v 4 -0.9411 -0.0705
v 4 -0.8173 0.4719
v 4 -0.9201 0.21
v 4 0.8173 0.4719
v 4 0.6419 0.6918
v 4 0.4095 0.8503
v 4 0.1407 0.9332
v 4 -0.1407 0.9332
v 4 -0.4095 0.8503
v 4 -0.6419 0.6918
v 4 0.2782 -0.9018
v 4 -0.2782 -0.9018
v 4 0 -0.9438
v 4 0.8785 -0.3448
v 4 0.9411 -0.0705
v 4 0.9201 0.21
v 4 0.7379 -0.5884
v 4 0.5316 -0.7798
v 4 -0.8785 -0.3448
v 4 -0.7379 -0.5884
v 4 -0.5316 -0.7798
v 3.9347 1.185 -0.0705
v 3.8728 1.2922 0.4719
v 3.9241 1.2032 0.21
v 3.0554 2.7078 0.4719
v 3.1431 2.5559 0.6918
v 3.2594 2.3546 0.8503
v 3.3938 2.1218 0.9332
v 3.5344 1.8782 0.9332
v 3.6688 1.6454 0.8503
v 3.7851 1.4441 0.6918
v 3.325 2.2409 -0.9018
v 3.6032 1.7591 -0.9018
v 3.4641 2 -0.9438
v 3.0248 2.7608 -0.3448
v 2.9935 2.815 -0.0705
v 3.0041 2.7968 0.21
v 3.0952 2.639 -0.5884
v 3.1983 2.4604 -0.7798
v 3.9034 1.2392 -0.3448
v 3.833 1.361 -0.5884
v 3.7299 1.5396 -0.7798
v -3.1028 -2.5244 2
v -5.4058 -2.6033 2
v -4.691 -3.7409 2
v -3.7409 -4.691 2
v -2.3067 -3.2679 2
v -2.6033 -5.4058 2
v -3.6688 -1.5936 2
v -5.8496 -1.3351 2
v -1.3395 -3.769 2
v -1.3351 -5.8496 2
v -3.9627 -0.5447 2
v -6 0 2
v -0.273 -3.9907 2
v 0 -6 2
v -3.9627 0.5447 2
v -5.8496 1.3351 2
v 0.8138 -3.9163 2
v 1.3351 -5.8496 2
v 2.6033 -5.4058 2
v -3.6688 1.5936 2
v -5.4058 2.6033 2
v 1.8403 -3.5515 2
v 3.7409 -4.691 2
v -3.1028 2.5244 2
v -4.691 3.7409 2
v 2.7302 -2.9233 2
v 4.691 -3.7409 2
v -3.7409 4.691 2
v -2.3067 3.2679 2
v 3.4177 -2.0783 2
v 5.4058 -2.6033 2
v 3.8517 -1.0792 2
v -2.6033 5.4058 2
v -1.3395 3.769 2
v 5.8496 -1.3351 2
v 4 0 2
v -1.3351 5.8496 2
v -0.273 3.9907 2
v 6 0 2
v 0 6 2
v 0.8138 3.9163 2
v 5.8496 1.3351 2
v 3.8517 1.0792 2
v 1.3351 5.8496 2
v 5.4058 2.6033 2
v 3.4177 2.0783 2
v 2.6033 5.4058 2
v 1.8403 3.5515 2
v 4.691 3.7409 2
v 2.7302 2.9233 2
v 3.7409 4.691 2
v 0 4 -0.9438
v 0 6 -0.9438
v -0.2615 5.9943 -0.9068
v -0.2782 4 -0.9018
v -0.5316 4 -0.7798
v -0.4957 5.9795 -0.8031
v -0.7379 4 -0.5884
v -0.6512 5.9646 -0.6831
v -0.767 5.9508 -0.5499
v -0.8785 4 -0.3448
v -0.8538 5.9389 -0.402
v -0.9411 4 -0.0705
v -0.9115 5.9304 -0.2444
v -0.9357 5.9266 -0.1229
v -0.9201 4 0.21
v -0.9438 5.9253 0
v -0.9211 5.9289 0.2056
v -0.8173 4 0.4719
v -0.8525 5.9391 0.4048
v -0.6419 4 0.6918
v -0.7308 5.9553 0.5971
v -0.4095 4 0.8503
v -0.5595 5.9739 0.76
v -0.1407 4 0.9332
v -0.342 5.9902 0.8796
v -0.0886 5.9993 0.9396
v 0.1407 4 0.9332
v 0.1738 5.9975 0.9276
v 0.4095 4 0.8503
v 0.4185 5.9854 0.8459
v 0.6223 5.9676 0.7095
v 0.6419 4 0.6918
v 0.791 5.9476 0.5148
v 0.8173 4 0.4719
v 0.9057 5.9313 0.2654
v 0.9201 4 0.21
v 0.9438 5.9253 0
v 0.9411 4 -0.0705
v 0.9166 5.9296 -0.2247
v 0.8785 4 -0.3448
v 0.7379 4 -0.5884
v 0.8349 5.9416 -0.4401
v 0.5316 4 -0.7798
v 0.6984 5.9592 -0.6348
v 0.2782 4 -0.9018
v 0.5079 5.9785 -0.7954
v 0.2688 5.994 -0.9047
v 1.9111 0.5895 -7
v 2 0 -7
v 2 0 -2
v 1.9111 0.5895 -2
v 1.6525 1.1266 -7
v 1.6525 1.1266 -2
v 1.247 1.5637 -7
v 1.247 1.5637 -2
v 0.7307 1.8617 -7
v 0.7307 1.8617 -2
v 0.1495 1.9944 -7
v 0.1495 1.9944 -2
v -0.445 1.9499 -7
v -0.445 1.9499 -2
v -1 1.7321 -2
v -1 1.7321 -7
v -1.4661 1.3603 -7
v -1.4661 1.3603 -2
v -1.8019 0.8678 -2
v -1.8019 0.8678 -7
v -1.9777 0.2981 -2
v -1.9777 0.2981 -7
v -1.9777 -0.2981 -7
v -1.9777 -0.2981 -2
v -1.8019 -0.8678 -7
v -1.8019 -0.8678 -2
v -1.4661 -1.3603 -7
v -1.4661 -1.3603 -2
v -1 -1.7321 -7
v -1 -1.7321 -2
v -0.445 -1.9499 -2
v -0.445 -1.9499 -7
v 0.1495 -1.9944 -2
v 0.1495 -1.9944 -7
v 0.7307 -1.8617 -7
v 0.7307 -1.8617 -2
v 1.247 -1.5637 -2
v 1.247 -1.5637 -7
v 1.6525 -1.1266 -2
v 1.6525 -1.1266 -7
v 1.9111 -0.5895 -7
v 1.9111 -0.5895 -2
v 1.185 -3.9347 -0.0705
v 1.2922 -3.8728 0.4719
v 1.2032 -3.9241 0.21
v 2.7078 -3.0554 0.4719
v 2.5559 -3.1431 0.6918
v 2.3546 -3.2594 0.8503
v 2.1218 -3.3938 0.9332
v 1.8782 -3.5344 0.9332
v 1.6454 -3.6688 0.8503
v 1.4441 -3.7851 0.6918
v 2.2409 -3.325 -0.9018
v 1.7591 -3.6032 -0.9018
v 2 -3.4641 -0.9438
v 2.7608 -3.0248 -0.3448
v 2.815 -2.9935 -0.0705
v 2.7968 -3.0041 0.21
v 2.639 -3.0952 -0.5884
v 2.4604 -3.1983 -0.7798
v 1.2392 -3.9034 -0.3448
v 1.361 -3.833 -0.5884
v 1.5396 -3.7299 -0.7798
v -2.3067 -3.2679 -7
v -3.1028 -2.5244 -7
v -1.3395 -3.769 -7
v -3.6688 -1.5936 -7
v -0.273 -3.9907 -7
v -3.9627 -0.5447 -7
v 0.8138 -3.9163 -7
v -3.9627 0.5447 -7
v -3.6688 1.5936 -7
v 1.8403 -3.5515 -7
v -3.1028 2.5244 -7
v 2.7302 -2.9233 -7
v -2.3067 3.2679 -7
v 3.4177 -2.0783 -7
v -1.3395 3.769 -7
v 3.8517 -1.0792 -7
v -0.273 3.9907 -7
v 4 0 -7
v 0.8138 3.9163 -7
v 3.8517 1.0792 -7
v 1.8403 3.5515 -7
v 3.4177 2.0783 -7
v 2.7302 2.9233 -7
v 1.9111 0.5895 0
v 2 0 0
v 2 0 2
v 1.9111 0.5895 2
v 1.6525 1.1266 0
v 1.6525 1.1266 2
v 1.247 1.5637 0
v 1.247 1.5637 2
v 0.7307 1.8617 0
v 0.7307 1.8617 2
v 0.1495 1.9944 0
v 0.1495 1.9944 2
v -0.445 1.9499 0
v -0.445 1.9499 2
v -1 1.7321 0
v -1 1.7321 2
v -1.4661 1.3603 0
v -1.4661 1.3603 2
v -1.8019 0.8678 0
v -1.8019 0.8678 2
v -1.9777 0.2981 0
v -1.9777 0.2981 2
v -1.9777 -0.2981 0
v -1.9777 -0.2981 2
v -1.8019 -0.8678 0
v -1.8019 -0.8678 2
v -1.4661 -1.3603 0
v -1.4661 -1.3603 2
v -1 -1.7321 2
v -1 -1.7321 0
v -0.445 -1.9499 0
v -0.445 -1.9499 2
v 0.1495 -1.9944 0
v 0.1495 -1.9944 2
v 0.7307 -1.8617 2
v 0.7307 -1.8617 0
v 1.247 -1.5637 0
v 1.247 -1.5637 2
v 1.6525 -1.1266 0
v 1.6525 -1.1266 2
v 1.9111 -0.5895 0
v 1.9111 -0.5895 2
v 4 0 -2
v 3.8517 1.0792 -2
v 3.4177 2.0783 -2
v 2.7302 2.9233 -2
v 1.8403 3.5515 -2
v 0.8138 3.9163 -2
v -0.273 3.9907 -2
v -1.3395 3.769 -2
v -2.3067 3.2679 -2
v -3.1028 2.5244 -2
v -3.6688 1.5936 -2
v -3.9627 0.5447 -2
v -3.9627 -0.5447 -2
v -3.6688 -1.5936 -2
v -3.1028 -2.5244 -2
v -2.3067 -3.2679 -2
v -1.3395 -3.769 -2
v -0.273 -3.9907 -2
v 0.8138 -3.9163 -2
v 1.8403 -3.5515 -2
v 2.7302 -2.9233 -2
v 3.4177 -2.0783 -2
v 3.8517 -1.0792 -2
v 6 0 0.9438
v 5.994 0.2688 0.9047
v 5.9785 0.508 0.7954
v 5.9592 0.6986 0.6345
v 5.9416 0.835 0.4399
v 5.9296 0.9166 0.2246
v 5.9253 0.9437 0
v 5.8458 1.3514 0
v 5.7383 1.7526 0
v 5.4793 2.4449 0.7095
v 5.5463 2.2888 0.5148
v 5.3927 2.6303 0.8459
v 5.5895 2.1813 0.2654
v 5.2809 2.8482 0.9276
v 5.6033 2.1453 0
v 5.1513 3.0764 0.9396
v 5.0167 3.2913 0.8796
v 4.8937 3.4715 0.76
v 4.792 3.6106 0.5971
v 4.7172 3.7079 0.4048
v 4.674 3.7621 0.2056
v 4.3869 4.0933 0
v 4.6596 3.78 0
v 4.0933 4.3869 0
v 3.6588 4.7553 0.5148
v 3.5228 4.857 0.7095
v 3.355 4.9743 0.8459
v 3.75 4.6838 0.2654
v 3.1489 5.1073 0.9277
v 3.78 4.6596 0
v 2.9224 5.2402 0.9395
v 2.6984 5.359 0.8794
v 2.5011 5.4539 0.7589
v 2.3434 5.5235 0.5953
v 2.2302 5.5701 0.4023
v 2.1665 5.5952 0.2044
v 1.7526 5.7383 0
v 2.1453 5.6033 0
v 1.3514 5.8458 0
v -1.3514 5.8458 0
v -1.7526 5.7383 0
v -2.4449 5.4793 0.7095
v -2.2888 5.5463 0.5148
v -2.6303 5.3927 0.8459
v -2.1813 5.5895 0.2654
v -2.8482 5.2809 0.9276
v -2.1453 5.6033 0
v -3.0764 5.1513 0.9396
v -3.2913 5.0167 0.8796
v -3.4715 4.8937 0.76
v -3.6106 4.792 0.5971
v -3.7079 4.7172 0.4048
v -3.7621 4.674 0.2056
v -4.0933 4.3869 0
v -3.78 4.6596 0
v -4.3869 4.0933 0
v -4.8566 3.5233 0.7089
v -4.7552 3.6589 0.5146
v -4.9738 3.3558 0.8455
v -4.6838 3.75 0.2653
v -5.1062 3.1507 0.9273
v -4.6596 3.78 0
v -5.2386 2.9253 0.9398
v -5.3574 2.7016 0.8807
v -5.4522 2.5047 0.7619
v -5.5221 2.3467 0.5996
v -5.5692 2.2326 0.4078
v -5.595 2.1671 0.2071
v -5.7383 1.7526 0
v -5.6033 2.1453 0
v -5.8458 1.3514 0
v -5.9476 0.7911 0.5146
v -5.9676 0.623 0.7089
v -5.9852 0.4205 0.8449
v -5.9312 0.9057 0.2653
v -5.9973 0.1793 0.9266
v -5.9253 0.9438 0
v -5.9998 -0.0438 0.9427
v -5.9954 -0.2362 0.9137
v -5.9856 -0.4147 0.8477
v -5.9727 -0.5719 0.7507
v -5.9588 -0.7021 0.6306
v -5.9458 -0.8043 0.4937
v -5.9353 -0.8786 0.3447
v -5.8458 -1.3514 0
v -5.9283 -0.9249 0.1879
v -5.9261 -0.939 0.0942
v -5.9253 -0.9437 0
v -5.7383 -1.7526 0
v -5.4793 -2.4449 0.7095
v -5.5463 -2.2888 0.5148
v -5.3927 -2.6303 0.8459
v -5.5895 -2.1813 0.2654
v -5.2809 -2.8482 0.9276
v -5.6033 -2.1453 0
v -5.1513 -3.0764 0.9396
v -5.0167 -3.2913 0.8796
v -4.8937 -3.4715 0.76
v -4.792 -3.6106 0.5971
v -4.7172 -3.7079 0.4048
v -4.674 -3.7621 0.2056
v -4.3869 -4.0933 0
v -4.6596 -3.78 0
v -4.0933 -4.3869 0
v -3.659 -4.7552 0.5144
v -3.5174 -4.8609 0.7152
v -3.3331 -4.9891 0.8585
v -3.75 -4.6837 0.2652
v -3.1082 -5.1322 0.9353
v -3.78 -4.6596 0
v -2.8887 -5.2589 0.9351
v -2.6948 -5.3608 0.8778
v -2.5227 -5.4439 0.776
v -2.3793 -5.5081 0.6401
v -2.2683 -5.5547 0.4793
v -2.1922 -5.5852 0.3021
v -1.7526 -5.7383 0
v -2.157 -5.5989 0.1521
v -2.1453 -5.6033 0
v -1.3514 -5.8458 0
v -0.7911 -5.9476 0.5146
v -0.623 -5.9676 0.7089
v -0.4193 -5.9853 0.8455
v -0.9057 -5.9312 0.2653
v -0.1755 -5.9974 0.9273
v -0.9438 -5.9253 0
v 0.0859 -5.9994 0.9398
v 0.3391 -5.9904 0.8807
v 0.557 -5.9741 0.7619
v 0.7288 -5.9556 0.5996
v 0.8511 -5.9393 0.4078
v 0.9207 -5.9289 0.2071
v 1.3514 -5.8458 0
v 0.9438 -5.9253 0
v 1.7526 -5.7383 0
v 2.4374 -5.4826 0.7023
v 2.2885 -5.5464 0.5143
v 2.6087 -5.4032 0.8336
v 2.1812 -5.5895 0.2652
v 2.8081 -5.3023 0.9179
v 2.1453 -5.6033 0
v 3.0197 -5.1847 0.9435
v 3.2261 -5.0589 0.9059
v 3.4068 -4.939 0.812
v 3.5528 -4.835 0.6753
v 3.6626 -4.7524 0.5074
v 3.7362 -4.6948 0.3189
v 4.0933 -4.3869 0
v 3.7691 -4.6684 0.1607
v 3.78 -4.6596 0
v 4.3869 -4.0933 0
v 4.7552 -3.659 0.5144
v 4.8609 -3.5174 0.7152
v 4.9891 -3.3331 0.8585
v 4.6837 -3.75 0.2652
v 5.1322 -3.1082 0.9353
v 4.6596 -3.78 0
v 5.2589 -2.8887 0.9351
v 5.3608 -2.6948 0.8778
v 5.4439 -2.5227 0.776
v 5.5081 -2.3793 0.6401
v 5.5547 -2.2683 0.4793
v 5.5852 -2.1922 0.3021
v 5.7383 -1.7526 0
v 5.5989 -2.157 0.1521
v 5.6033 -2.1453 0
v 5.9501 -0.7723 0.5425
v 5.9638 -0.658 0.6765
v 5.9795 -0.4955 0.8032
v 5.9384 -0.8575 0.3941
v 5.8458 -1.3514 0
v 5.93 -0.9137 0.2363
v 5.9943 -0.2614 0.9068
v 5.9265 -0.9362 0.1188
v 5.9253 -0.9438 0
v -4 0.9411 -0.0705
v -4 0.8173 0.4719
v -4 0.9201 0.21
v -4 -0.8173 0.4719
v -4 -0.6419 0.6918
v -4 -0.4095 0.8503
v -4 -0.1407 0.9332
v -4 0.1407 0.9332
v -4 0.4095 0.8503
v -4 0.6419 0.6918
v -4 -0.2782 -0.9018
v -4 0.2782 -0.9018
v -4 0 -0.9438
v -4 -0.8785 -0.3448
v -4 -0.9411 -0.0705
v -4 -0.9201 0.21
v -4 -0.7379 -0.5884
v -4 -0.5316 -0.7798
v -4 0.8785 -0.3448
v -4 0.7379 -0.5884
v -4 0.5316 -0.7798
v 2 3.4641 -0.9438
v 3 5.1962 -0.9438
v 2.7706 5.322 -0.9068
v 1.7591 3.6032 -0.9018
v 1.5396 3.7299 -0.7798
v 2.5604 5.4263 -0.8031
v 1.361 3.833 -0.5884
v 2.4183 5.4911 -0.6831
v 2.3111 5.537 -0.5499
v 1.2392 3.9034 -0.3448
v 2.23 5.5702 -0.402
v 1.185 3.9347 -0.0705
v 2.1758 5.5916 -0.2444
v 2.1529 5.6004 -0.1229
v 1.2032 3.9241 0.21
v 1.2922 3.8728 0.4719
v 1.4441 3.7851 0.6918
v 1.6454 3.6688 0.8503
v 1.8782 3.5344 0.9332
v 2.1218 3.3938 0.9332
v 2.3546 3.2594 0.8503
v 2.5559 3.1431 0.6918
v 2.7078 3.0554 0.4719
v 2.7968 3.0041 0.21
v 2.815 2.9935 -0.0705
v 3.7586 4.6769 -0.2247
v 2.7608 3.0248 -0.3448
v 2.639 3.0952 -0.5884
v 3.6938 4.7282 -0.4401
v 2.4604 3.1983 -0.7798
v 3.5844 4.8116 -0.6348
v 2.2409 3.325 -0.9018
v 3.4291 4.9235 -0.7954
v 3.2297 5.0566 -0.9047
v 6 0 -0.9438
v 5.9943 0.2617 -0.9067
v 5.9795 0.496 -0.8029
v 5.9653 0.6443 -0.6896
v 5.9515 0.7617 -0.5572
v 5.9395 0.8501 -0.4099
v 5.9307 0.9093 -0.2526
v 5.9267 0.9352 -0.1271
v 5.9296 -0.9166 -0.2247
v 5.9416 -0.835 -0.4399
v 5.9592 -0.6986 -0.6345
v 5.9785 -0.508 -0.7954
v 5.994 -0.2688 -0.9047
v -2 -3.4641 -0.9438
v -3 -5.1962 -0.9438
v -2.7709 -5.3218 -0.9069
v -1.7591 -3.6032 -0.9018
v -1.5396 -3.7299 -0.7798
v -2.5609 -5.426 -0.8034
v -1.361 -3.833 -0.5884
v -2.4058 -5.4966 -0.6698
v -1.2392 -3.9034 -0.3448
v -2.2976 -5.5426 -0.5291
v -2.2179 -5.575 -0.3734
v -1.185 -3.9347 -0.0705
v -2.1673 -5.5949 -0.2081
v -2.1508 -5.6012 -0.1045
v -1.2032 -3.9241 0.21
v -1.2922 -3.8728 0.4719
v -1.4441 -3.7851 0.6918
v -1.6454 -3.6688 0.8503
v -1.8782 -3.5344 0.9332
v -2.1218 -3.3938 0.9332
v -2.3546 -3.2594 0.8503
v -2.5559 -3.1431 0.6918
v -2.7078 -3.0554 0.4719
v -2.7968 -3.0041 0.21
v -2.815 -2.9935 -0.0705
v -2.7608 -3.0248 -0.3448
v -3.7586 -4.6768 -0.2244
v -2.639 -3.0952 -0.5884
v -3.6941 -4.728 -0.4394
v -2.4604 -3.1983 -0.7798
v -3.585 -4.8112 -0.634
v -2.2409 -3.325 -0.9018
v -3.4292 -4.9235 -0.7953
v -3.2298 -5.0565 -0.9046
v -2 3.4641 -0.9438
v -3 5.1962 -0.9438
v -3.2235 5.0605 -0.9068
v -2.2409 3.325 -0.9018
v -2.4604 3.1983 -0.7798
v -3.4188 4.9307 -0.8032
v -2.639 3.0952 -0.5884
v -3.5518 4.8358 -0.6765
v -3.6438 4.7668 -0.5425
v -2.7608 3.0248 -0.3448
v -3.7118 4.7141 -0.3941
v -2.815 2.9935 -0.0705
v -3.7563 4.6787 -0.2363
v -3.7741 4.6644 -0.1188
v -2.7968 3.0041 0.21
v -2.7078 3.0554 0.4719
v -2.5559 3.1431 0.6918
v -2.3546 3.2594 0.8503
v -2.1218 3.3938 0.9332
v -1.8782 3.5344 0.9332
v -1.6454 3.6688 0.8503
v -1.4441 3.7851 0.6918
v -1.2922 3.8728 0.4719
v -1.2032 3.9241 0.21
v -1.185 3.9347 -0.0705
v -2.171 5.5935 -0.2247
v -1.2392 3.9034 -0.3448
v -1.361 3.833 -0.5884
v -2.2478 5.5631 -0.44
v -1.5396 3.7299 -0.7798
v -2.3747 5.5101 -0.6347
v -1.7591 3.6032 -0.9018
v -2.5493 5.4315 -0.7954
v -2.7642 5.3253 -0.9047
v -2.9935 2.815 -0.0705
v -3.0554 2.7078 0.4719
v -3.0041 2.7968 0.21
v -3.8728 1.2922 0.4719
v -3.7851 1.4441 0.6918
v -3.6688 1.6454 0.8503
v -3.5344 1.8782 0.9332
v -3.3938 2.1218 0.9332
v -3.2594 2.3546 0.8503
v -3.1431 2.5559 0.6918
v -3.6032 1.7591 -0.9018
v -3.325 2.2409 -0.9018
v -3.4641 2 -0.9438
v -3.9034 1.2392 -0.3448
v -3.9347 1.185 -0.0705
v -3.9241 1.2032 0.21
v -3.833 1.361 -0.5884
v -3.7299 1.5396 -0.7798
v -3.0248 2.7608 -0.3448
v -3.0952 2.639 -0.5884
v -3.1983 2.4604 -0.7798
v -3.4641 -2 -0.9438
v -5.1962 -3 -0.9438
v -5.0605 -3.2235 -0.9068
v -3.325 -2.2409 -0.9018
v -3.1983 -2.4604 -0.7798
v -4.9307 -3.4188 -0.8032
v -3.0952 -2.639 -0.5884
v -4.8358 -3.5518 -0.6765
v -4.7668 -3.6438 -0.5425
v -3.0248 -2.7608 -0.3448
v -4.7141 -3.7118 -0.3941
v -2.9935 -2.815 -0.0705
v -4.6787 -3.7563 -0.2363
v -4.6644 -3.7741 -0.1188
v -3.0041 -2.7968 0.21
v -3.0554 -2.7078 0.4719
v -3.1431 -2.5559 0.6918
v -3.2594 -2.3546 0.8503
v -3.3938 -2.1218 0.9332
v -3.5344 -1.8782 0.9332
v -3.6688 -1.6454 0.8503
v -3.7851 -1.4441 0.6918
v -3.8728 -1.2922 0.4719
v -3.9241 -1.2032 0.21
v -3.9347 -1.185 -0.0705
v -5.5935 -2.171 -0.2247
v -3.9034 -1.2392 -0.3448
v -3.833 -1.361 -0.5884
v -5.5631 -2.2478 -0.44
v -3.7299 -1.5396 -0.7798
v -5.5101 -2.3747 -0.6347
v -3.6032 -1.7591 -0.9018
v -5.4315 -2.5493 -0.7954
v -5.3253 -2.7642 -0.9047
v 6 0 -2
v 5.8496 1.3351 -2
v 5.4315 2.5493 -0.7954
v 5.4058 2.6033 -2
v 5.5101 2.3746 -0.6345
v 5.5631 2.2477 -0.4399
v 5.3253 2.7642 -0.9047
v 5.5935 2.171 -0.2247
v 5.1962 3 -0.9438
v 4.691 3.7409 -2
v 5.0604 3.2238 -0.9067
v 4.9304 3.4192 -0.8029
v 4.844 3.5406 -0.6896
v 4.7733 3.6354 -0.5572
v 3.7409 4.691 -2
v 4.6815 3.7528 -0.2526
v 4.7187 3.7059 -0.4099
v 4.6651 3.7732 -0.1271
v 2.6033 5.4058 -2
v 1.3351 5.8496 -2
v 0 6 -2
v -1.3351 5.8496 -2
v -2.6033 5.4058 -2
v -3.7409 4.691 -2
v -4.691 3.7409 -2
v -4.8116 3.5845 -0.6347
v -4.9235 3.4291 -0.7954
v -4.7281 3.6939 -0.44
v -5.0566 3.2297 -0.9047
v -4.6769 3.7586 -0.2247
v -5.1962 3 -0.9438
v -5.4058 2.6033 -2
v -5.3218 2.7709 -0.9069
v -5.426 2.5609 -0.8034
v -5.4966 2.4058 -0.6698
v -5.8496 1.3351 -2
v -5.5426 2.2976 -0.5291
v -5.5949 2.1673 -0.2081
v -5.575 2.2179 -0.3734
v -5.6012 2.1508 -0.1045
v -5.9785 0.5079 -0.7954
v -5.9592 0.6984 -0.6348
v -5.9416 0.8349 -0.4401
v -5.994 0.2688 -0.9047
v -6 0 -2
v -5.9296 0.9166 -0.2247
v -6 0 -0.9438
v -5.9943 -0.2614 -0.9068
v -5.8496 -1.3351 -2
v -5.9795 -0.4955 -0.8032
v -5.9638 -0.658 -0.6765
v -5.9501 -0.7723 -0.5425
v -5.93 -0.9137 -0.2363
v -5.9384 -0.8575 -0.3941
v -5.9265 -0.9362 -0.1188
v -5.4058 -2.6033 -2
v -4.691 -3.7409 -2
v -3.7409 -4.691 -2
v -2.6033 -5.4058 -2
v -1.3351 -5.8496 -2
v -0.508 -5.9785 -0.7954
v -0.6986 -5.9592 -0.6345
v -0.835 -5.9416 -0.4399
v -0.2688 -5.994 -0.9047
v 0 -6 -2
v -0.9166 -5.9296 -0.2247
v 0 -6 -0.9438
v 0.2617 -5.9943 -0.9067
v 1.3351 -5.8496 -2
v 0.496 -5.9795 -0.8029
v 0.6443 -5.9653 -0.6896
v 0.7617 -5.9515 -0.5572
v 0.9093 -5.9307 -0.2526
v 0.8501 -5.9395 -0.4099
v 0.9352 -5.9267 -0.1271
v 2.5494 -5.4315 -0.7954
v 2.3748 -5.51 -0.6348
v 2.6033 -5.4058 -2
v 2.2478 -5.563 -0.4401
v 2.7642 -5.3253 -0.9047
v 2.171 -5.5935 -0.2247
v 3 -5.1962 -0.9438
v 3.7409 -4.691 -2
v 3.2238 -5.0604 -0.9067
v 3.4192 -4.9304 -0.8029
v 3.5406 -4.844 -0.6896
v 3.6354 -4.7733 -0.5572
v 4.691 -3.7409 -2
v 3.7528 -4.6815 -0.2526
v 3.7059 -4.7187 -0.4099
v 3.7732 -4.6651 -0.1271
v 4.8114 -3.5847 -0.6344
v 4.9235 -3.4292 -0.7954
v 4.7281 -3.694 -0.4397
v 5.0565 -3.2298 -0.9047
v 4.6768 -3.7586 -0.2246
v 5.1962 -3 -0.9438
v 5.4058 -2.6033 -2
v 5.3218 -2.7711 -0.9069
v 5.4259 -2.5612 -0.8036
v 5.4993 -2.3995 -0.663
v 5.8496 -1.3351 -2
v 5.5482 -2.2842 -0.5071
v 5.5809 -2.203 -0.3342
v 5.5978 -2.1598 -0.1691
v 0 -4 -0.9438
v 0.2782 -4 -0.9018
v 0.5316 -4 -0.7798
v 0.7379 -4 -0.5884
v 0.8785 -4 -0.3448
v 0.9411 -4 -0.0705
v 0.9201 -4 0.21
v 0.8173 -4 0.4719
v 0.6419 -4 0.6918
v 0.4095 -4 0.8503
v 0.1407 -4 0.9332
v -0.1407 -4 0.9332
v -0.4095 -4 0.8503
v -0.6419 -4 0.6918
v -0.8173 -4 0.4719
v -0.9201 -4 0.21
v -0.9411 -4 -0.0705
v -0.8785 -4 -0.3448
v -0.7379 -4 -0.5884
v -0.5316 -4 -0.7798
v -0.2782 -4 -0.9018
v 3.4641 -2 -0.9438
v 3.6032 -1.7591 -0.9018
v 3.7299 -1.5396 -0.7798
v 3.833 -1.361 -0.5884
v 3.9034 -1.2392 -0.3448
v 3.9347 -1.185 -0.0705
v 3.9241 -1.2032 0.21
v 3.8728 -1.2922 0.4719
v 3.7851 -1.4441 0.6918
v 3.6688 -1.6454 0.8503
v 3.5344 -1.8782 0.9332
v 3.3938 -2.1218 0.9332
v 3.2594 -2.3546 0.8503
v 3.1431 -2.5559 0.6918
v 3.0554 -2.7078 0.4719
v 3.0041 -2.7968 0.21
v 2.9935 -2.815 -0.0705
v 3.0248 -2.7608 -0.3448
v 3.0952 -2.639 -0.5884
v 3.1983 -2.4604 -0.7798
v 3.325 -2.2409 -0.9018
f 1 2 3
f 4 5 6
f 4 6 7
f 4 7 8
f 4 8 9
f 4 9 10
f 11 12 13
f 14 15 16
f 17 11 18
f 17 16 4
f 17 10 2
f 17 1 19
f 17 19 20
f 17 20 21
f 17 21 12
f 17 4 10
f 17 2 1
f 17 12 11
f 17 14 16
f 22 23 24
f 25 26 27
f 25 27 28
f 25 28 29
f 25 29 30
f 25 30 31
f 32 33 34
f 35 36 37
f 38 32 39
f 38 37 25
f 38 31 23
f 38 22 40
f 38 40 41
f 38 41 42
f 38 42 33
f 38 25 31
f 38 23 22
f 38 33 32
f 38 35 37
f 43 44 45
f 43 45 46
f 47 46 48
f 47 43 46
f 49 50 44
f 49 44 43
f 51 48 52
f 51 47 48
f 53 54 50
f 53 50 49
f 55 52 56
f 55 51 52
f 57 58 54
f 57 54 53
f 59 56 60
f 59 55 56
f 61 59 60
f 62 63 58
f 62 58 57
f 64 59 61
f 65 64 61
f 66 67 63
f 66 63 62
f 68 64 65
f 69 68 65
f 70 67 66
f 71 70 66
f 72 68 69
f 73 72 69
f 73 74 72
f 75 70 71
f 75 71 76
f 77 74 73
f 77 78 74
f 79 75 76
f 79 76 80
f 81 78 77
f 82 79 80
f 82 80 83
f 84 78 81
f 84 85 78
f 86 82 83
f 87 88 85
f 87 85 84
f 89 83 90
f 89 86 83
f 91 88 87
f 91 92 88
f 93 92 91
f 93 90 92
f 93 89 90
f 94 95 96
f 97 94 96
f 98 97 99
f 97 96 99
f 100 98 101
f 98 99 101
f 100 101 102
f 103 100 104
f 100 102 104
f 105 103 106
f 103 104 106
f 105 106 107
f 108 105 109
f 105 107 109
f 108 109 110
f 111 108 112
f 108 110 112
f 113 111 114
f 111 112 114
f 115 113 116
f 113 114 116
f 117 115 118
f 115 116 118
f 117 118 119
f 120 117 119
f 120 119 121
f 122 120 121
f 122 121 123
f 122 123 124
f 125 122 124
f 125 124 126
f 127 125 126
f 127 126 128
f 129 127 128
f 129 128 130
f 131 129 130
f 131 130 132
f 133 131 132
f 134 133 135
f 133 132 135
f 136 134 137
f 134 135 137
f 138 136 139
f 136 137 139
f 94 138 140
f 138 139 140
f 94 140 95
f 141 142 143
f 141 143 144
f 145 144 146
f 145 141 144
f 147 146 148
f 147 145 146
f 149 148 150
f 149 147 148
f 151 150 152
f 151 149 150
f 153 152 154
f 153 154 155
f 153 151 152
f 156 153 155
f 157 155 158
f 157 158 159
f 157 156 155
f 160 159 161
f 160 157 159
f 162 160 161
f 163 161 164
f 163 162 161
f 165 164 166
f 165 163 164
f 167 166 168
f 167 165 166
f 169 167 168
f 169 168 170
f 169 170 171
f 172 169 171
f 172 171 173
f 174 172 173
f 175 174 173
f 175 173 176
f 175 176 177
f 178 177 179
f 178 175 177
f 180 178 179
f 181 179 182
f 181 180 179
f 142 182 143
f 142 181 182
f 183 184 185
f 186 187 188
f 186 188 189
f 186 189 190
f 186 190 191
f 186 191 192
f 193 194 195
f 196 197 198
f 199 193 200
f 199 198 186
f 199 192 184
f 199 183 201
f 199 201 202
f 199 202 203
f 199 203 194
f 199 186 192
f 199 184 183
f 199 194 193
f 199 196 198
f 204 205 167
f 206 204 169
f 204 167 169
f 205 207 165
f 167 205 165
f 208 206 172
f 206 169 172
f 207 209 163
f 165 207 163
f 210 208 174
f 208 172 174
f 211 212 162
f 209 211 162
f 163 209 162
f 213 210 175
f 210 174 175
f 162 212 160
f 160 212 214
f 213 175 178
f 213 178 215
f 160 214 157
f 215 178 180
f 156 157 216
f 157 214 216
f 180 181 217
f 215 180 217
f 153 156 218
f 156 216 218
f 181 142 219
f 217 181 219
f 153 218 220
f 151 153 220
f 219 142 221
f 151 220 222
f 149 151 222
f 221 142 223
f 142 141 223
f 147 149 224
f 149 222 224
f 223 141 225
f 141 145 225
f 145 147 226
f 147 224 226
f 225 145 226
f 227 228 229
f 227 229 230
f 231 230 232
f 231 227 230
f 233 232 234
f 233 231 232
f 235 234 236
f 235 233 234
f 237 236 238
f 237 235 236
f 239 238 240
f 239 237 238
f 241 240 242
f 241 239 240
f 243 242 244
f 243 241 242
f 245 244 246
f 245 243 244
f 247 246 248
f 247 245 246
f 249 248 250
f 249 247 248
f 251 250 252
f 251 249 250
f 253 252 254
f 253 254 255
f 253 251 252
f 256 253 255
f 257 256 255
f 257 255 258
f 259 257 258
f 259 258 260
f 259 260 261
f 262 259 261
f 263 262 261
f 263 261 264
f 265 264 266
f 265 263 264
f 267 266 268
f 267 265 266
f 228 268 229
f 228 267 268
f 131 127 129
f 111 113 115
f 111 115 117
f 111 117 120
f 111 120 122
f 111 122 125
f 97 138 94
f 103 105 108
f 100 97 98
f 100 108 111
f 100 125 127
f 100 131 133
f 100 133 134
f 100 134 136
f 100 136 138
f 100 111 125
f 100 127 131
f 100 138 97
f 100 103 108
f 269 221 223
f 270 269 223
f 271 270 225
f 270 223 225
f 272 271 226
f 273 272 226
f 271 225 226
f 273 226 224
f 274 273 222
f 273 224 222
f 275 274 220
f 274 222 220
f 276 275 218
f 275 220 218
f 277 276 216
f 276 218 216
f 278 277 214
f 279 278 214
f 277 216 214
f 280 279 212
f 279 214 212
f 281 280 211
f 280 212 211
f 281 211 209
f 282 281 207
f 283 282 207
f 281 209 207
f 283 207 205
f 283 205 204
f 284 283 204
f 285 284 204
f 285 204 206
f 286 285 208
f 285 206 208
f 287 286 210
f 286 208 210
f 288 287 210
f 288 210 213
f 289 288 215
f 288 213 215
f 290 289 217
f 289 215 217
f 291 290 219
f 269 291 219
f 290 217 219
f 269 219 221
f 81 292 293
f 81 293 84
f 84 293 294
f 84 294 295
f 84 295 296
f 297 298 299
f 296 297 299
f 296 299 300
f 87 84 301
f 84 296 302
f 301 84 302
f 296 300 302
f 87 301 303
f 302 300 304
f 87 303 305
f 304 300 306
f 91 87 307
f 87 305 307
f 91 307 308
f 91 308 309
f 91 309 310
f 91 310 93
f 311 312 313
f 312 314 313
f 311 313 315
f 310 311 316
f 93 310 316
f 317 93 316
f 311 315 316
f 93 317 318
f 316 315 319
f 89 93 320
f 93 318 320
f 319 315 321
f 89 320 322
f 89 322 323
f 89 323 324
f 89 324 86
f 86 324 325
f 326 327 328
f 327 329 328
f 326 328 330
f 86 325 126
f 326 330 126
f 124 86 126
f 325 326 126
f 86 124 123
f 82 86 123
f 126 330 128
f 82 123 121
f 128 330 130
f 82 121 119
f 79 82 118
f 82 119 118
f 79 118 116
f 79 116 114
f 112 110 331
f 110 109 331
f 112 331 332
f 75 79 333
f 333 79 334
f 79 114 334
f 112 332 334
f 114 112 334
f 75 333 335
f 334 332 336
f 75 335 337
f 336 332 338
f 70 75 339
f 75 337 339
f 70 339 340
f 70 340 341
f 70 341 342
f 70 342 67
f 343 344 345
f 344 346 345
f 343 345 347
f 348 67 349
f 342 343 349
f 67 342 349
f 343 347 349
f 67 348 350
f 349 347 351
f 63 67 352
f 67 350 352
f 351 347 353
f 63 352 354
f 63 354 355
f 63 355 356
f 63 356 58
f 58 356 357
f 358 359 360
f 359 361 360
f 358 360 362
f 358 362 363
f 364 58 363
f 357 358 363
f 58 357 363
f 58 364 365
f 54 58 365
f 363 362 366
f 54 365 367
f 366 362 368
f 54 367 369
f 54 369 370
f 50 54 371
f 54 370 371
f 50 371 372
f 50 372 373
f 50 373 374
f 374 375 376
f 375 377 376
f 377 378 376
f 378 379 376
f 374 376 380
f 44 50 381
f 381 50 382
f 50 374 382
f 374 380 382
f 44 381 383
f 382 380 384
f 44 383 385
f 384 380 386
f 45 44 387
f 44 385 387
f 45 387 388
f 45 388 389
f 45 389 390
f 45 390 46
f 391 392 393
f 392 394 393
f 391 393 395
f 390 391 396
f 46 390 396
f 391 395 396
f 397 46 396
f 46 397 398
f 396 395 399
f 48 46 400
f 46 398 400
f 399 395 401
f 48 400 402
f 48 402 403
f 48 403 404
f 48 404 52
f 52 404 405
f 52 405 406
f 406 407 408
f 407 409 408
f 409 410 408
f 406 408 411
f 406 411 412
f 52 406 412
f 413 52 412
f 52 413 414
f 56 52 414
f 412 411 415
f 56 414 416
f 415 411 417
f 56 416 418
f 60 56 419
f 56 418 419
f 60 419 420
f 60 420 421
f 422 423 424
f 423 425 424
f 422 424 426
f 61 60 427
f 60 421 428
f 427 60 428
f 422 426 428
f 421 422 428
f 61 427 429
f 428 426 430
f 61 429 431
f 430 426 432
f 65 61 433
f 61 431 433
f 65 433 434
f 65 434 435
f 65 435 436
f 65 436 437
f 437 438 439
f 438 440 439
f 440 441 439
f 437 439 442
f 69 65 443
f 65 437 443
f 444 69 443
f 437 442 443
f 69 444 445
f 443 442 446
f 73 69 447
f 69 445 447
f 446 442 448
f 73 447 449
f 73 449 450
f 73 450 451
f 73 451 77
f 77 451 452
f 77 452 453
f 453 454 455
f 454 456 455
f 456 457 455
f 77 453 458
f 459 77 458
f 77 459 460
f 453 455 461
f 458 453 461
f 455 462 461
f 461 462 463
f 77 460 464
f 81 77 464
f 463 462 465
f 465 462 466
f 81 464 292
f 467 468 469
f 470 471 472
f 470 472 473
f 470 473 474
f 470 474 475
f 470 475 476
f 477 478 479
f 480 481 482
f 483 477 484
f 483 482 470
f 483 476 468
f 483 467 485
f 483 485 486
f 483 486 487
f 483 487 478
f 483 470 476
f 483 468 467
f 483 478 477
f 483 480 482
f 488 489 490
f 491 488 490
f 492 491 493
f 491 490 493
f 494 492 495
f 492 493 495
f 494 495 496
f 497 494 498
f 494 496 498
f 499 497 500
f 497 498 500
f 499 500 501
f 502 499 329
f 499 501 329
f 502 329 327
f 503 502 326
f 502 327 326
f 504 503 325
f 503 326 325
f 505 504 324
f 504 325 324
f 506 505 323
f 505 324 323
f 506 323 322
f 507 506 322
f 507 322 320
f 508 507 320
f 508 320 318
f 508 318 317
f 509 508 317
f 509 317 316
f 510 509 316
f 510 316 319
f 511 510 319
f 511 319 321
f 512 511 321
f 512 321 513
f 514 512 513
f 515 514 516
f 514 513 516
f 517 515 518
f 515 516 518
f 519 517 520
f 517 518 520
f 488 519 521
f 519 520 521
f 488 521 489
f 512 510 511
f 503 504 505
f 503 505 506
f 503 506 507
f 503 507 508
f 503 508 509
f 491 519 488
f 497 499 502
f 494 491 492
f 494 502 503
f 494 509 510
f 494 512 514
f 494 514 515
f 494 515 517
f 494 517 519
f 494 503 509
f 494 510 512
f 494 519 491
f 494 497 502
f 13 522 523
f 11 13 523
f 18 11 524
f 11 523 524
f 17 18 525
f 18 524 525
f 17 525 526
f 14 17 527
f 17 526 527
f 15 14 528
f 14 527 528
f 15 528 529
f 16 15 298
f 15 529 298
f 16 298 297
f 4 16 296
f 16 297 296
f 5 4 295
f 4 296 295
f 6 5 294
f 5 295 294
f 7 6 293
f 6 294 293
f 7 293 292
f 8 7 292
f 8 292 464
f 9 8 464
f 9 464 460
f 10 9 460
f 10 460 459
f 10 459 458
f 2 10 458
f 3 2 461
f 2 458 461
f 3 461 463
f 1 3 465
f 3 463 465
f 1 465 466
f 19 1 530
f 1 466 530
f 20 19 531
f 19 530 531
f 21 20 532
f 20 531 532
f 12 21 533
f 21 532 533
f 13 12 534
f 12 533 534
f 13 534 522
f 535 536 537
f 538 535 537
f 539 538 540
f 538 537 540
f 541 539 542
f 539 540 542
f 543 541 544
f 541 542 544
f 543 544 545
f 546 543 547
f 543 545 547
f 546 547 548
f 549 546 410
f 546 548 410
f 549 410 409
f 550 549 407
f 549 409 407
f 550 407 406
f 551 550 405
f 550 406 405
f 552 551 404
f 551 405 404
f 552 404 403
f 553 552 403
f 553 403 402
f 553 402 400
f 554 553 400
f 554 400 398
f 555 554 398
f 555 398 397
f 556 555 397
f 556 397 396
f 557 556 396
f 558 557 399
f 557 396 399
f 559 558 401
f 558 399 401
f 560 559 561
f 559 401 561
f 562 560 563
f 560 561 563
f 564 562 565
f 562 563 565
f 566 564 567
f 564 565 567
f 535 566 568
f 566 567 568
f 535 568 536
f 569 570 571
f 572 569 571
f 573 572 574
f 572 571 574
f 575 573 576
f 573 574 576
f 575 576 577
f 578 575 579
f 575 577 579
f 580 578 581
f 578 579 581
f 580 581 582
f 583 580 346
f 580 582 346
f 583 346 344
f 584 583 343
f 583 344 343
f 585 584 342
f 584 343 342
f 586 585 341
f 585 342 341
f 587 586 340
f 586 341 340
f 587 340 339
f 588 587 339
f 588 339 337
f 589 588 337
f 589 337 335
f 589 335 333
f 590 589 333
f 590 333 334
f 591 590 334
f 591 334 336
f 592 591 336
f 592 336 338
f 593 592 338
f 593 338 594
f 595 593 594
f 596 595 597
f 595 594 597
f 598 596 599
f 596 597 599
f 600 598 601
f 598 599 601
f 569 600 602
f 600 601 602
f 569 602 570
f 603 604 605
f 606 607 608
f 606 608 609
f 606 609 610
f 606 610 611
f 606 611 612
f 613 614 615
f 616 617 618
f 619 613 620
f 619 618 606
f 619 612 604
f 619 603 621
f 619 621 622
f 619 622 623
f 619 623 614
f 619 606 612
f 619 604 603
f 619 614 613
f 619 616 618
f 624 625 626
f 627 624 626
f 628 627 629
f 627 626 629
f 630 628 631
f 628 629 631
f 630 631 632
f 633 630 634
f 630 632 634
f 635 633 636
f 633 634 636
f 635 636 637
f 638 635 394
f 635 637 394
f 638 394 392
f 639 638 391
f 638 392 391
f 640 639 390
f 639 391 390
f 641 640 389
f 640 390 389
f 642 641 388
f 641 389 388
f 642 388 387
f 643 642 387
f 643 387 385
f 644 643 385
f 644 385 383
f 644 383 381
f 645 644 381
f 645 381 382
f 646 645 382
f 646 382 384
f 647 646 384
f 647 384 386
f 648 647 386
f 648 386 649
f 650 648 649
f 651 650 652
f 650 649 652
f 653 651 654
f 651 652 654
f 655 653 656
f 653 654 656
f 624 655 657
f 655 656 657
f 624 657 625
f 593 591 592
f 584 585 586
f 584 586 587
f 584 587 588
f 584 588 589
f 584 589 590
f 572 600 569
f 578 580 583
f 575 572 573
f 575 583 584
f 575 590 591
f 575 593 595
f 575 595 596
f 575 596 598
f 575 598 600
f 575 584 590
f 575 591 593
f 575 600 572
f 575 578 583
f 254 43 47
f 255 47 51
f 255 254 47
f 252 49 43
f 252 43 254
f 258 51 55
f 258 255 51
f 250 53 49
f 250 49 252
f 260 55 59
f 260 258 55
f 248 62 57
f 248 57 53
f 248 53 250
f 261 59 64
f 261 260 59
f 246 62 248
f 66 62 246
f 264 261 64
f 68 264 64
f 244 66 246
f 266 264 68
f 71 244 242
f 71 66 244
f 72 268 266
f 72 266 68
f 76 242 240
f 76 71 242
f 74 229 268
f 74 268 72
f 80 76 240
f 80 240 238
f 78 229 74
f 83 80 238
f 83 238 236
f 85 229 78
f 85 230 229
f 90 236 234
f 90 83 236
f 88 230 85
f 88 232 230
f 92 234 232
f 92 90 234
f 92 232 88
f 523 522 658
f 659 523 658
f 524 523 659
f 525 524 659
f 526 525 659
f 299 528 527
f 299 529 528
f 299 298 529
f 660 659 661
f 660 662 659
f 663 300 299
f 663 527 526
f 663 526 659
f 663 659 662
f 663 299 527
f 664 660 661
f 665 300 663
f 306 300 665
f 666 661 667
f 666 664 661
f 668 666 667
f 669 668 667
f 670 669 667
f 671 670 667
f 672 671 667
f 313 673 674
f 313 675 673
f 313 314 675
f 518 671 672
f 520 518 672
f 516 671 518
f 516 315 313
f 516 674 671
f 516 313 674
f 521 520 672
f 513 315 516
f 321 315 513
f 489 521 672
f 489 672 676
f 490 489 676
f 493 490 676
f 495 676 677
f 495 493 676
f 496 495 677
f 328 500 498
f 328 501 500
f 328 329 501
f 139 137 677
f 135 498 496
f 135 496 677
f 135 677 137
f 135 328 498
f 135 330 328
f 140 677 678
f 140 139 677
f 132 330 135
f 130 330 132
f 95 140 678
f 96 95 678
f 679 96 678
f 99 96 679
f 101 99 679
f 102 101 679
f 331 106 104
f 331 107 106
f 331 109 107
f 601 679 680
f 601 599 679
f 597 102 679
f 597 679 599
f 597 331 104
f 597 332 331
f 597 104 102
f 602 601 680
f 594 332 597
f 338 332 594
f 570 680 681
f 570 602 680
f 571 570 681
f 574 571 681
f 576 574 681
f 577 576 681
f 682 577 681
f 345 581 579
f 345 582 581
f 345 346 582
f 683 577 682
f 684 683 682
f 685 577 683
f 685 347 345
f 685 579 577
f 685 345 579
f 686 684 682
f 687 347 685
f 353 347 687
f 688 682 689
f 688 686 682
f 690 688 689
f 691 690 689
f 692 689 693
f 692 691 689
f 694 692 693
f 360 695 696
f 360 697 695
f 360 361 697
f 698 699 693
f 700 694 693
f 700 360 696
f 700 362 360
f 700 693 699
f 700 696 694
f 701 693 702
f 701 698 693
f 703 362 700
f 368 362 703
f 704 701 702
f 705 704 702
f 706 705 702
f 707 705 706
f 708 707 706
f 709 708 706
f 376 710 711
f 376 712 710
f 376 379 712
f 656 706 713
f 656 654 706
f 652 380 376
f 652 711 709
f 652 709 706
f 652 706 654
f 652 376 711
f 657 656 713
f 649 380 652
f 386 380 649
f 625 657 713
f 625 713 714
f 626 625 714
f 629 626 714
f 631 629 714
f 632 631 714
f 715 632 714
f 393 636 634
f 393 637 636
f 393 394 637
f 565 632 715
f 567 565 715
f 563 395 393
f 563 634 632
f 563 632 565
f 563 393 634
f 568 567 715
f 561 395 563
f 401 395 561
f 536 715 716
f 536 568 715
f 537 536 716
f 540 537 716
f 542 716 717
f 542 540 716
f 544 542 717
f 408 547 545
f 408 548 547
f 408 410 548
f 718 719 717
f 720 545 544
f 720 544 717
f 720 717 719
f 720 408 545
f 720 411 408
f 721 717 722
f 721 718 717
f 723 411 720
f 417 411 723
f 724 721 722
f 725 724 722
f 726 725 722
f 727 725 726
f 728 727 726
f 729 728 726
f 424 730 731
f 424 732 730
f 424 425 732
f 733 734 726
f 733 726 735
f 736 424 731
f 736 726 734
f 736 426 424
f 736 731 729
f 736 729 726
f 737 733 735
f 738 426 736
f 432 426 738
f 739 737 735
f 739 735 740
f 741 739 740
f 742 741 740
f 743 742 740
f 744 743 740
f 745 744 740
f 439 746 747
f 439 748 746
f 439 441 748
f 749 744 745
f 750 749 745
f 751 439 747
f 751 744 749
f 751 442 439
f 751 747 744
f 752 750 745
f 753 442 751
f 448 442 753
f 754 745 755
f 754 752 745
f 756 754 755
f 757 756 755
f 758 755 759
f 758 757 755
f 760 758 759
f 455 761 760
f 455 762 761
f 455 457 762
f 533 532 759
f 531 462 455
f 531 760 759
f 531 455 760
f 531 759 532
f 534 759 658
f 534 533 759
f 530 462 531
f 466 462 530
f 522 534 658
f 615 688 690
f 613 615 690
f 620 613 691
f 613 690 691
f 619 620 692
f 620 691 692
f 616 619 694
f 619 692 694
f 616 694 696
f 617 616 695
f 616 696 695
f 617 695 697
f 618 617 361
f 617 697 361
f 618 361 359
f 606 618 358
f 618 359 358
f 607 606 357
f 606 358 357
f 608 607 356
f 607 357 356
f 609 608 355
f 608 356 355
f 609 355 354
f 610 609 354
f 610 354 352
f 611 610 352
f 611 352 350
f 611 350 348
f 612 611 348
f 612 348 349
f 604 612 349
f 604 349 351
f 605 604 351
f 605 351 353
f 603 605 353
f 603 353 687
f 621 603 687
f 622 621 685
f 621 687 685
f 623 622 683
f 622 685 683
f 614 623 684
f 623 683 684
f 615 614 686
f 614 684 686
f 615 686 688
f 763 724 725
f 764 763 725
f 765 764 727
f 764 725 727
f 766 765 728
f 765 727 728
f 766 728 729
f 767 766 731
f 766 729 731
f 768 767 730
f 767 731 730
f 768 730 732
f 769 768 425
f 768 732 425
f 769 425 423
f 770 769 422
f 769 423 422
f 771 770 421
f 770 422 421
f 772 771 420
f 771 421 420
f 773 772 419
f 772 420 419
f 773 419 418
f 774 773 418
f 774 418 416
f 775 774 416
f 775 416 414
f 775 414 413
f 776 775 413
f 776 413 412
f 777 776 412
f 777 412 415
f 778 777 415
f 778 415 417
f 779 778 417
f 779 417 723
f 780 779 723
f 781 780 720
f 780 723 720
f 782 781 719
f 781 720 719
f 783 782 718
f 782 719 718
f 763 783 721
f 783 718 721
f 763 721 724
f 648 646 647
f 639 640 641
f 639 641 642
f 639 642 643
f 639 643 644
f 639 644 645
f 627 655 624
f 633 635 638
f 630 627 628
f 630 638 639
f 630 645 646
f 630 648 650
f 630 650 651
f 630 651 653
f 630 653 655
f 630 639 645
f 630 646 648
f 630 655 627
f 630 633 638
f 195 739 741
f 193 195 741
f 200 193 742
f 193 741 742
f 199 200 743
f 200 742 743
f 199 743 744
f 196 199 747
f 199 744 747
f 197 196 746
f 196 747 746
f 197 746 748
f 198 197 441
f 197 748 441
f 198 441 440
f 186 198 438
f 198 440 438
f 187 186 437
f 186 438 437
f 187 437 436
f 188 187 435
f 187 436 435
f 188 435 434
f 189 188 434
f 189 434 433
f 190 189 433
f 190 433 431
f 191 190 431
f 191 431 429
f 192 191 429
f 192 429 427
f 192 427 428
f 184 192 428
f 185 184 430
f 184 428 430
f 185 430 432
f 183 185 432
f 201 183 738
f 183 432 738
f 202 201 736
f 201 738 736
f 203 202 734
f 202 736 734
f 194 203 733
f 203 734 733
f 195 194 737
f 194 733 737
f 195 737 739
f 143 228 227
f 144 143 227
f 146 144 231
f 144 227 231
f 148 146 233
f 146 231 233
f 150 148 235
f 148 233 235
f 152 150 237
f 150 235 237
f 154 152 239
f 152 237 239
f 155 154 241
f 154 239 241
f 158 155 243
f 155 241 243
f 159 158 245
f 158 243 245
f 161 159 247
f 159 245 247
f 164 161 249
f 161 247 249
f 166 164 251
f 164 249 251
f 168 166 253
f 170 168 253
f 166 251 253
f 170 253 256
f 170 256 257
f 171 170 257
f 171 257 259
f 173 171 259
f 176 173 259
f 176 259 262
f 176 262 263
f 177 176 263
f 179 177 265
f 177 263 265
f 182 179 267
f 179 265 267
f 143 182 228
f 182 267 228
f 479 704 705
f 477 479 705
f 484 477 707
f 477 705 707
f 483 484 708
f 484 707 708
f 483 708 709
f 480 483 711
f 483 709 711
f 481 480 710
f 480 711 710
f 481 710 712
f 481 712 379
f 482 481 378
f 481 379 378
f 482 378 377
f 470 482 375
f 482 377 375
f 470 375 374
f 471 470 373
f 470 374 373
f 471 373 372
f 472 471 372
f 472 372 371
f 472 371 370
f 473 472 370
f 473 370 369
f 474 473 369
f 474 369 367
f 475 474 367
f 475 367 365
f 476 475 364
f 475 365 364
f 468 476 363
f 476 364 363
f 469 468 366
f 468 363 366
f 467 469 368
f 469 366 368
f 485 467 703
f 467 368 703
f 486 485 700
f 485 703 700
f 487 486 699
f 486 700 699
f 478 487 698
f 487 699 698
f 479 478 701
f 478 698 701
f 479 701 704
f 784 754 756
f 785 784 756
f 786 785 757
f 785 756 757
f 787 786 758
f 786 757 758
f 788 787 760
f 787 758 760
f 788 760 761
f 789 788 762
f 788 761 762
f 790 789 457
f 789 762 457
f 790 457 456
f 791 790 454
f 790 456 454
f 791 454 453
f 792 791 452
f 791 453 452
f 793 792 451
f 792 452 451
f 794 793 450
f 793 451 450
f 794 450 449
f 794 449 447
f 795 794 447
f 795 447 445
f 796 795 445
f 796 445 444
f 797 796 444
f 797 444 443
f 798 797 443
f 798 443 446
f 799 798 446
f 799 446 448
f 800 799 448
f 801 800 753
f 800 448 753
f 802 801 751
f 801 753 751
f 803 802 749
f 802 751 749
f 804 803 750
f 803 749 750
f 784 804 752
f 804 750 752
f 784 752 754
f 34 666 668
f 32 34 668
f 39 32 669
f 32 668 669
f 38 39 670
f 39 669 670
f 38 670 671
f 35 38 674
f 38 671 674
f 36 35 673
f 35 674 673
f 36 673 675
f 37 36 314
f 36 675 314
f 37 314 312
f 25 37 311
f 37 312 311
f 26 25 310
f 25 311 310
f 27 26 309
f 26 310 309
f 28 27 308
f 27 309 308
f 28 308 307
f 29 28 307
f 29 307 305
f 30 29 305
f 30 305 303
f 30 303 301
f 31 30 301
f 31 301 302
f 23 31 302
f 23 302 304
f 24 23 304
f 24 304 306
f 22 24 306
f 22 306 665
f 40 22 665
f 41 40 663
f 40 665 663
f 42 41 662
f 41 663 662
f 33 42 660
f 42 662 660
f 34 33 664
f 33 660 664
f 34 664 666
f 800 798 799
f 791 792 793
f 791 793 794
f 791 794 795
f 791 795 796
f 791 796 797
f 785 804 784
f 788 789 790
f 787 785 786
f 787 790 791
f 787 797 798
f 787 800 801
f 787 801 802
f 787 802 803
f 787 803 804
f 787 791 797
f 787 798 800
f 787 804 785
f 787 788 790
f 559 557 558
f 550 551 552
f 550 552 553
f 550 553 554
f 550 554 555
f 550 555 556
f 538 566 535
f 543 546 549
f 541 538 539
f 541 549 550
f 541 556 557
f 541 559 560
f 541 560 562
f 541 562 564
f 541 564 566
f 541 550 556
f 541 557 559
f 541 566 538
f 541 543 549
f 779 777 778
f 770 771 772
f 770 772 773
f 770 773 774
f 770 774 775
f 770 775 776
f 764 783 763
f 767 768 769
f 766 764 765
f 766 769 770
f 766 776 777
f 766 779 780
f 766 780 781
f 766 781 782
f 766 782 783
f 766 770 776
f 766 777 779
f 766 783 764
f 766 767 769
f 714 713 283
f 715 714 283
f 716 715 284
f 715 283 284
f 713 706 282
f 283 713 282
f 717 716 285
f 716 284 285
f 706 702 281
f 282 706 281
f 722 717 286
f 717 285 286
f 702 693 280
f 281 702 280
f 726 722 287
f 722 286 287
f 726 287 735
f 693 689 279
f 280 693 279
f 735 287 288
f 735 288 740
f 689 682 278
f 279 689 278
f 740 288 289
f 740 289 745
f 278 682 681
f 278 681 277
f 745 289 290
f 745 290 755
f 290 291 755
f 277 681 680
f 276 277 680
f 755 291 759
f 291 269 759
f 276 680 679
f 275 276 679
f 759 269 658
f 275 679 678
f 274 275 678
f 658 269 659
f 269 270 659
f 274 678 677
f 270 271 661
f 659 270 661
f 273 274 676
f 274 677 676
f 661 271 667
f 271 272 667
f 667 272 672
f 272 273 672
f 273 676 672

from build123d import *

# Parameters (mm, degrees)
SKETCH1_R           = 6
SKETCH1_R_2         = 4
SKETCH1_R_3         = 2
BOSS_EXTRUDE1_DEPTH = 2
SKETCH3_R           = 0.94375
CUT_EXTRUDE1_DEPTH  = 2
CIRPATTERN1_COUNT   = 12
BOSS_EXTRUDE2_START = -7
SKETCH1_3_R         = 4
SKETCH1_3_R_2       = 2
BOSS_EXTRUDE2_DEPTH = 5


with BuildPart() as part:
    # Sketch1 → Boss-Extrude1 (new, symmetric)
    # profile 1 of 2: a face of its own
    with BuildSketch(Plane.XY):
        Circle(SKETCH1_R)
        Circle(SKETCH1_R_2, mode=Mode.SUBTRACT)
    # profile 2 of 2: a face of its own
    with BuildSketch(Plane.XY):
        Circle(SKETCH1_R_2)
        Circle(SKETCH1_R_3, mode=Mode.SUBTRACT)
    extrude(amount=BOSS_EXTRUDE1_DEPTH, both=True)

    # Sketch3 → Cut-Extrude1 (cut)
    with BuildSketch(Plane(origin=(0, -6, 0), x_dir=(-1, 0, 0), z_dir=(0, -1, 0))):
        with Locations(Location((0, 0, 0), (0, 0, 90))):
            Circle(SKETCH3_R)
    cut_extrude1 = extrude(amount=-CUT_EXTRUDE1_DEPTH, mode=Mode.SUBTRACT)

    # CirPattern1: Cut-Extrude1 ×12 about axis
    cirpattern1_axis = Axis((0, 0, 0), (0, 0, 1))
    for i in range(1, CIRPATTERN1_COUNT):
        add(cut_extrude1.rotate(cirpattern1_axis, i * 360 / CIRPATTERN1_COUNT), mode=Mode.SUBTRACT)

    # Sketch1<3> → Boss-Extrude2 (add)
    with BuildSketch(Plane.XY.offset(BOSS_EXTRUDE2_START)):
        Circle(SKETCH1_3_R)
        Circle(SKETCH1_3_R_2, mode=Mode.SUBTRACT)
    extrude(amount=BOSS_EXTRUDE2_DEPTH)


solid = part.part
